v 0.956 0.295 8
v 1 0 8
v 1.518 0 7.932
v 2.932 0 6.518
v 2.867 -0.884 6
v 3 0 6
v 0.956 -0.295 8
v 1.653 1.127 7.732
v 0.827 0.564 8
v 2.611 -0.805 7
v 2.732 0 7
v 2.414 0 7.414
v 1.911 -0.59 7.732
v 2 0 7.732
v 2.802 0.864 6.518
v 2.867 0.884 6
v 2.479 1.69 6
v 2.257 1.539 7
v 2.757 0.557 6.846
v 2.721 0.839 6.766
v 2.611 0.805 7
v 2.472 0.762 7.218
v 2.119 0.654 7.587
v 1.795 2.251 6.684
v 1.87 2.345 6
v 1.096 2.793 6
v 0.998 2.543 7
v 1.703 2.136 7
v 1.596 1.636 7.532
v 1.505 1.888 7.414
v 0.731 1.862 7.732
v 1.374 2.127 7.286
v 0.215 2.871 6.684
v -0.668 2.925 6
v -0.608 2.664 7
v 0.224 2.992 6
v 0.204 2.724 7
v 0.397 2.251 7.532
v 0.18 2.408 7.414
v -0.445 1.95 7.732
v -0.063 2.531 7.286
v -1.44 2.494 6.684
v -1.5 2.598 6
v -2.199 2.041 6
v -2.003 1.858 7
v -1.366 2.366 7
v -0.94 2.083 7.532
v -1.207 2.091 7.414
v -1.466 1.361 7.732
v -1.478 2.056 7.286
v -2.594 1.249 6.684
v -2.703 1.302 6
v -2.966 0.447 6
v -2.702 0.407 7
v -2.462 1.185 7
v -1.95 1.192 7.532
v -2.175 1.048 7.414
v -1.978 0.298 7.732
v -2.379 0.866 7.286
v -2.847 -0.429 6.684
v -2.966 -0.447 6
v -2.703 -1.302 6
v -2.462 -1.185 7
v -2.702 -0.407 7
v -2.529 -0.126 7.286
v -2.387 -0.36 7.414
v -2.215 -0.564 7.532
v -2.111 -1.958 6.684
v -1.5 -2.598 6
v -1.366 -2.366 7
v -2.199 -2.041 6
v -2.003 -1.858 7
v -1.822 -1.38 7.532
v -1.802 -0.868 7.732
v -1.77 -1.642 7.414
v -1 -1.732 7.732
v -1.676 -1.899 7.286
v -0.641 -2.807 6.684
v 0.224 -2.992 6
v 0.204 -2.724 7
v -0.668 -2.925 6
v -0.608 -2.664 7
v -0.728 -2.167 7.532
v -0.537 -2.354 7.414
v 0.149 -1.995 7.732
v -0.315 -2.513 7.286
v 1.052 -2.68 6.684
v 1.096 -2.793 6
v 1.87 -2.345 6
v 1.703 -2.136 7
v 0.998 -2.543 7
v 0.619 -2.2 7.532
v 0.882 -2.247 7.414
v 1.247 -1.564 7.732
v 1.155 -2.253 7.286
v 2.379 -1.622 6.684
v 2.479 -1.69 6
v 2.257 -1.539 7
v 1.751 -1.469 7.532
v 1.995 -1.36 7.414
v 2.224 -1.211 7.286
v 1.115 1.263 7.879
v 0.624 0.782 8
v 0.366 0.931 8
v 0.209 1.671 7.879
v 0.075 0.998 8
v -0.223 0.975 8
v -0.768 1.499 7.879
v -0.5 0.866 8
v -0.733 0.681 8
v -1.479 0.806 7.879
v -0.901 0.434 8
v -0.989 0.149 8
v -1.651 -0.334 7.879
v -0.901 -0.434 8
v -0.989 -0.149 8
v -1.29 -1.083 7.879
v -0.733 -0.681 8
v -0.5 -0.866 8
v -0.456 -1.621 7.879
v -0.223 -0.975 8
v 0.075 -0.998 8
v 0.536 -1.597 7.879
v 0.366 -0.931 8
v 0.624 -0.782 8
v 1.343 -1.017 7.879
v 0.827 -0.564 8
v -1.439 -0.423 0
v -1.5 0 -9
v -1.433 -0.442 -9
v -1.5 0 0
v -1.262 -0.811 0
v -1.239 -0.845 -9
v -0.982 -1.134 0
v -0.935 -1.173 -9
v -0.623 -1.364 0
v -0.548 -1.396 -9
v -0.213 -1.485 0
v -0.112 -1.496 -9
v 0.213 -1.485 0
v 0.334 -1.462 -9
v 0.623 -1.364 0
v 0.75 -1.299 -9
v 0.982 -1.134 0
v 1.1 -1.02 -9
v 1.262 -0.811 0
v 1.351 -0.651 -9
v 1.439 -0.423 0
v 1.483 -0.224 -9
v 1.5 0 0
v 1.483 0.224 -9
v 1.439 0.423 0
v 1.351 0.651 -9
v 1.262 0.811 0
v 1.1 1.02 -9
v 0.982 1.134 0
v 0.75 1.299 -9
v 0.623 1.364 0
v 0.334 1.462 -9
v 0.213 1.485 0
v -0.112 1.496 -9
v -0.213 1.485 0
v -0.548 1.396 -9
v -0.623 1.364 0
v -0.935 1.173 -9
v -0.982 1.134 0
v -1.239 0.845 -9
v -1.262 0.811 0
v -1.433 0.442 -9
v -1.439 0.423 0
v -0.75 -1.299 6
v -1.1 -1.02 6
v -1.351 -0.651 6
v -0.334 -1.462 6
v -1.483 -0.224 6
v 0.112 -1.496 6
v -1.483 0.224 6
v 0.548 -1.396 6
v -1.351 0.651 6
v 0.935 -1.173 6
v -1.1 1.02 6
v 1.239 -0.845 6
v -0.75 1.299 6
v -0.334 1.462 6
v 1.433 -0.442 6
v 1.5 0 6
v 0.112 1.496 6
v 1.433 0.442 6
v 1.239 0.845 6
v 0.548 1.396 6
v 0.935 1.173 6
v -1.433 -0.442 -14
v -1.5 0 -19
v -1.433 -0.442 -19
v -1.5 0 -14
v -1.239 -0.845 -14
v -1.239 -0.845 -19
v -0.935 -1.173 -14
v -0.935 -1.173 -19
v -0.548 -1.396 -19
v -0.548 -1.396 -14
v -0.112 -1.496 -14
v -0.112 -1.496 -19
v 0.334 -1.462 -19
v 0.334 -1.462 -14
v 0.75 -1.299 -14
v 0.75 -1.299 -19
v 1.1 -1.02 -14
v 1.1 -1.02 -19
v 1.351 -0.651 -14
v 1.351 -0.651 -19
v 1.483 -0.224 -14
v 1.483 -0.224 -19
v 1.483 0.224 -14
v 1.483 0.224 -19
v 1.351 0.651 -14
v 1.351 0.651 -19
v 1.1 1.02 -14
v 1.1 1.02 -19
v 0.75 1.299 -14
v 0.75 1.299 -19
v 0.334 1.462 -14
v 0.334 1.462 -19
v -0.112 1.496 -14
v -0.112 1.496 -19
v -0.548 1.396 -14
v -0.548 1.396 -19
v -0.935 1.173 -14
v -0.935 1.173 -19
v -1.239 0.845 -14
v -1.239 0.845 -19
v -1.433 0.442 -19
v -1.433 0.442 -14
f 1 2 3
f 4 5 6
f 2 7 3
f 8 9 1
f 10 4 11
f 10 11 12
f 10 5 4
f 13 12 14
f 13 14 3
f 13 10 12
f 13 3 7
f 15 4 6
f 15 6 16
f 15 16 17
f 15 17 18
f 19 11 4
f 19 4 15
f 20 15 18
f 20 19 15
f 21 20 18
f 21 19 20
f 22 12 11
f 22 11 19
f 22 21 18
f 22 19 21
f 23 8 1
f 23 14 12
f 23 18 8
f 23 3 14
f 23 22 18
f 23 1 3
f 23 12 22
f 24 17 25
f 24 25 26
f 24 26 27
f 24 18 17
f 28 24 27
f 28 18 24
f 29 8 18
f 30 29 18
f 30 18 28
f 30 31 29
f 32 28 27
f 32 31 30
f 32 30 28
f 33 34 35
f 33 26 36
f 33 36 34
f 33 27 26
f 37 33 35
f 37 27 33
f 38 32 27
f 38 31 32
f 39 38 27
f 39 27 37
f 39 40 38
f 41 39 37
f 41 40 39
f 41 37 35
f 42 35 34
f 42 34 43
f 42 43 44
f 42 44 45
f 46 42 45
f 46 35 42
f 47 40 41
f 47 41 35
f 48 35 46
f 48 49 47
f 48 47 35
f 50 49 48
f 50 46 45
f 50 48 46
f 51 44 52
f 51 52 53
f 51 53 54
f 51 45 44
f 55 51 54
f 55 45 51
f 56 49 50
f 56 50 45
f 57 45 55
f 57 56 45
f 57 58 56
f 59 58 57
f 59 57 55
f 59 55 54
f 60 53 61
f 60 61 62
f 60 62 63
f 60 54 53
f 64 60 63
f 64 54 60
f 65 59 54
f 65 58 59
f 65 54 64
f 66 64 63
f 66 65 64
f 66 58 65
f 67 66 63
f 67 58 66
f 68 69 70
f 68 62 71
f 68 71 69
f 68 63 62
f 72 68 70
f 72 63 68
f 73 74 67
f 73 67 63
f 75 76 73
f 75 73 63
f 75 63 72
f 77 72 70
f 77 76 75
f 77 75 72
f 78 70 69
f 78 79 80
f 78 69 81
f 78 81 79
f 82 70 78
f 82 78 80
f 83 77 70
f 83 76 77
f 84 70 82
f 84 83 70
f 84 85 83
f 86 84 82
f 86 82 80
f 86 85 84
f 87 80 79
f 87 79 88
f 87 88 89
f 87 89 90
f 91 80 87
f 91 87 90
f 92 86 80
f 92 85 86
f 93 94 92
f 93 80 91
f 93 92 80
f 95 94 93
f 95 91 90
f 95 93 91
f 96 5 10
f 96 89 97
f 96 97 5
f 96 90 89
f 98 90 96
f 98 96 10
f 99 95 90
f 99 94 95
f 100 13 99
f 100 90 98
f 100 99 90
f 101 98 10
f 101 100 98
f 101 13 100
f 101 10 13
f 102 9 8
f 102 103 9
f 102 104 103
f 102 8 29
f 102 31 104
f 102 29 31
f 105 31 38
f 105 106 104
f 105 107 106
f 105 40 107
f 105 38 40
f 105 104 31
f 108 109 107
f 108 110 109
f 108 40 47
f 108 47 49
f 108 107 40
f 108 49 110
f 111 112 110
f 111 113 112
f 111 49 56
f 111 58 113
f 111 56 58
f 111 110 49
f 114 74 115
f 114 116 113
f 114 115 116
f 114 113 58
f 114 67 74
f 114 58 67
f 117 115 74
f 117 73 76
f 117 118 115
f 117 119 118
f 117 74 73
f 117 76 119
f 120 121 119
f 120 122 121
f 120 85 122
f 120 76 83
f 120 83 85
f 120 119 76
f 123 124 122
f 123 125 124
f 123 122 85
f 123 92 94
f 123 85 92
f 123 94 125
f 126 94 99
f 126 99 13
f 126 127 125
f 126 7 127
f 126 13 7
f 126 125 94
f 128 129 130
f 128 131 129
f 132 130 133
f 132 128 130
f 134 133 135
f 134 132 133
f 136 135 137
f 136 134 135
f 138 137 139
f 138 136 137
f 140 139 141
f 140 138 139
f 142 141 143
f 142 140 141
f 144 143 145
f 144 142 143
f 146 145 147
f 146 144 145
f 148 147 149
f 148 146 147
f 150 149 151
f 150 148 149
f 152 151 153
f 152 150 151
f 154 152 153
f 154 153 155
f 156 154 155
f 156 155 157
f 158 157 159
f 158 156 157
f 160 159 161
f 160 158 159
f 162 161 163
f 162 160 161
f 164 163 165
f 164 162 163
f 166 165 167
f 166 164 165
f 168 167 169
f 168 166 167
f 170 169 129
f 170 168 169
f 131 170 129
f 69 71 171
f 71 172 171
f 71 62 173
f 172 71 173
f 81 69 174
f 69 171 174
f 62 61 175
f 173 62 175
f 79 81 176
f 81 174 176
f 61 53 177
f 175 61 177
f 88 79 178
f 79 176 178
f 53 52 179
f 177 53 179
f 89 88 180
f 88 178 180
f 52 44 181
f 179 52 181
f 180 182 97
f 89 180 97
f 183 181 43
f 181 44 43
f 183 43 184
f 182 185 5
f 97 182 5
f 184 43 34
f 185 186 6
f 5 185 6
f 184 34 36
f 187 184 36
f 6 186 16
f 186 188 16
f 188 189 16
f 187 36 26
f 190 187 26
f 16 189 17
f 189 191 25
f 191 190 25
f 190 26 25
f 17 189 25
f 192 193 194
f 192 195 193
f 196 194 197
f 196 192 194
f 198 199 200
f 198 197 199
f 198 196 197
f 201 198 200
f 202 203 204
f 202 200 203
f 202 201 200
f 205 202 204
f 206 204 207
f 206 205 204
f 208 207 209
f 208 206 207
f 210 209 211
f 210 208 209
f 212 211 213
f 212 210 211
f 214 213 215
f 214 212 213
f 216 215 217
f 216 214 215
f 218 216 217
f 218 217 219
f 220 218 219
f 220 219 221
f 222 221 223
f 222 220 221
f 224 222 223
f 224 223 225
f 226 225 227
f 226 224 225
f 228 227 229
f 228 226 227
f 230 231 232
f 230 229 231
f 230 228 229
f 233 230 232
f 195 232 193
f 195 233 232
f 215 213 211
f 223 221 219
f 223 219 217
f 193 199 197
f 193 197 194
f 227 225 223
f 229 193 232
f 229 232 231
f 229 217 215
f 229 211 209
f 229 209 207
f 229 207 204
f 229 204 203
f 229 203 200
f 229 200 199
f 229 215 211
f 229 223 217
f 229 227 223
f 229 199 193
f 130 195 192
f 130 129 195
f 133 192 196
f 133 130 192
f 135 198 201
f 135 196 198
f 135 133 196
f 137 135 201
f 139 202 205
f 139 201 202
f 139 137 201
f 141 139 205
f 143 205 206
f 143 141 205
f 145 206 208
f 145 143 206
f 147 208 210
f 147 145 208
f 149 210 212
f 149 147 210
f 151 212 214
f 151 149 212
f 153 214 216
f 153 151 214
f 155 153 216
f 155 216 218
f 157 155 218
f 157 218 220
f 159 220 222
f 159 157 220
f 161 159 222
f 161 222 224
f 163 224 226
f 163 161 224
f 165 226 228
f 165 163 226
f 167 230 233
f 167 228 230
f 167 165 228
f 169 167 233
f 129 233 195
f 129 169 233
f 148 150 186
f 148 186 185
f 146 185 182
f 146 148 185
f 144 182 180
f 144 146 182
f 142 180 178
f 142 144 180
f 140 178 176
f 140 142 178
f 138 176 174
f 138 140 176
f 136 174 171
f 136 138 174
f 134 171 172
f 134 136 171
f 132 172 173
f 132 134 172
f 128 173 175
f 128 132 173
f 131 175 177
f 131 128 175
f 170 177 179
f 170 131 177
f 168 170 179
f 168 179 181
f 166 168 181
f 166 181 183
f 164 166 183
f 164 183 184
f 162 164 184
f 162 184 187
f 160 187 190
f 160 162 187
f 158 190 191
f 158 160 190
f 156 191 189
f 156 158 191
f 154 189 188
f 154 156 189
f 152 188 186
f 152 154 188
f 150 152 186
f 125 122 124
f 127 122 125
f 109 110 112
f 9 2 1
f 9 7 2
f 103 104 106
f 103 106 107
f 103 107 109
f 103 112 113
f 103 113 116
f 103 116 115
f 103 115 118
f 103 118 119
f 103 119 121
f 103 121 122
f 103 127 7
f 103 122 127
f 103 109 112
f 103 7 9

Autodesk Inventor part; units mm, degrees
ref_plane "YZ Plane" through (0, 0, 0) normal (1, 0, 0) x (0, 1, 0)
ref_plane "XZ Plane" through (0, 0, 0) normal (0, 1, 0) x (-1, 0, 0)
ref_plane "XY Plane" through (0, 0, 0) normal (0, 0, 1) x (1, 0, 0)
sketch "スケッチ1" plane through (0, 0, 0) normal (0, 0, 1) x (1, 0, 0)
  circle A0 centre (0, 0) radius 1.5
  dimension "d0" = 3
extrude "押し出し1" add sketch "スケッチ1" along normal blind 6
sketch "スケッチ2" plane through (0, 0, 6) normal (0, 0, 1) x (1, 0, 0)
  circle A0 centre (0, 0) radius 1.5 projected
  circle A1 centre (0, 0) radius 3
  dimension "d3" = 6
extrude "押し出し2" add sketch "スケッチ2" along normal blind 2 contours A0 | A1
fillet "フィレット1" radius 2 1 edges at (-3, 0, 8)
thread "ねじ1" size "M3x0.5" class "6g" standard "ANSI Metric M Profile" full length
sketch "スケッチ3" plane through (0, 0, 0) normal (0, 0, -1) x (-1, 0, 0)
  circle A0 centre (0, 0) radius 1.5 projected
extrude "押し出し3" add sketch "スケッチ3" along normal blind 9
sketch "スケッチ4" plane through (0, 0, -9) normal (0, 0, -1) x (-1, 0, 0)
  circle A0 centre (0, 0) radius 1.5 projected
extrude "押し出し4" add sketch "スケッチ4" along normal blind 5
sketch "スケッチ5" plane through (0, 0, -14) normal (0, 0, -1) x (-1, 0, 0)
  circle A0 centre (0, 0) radius 1.5
  dimension "d13" = 3
extrude "押し出し5" add sketch "スケッチ5" along normal blind 5
properties part number "SB　25mmなべネジ" material "鋼、高強度、低合金"
